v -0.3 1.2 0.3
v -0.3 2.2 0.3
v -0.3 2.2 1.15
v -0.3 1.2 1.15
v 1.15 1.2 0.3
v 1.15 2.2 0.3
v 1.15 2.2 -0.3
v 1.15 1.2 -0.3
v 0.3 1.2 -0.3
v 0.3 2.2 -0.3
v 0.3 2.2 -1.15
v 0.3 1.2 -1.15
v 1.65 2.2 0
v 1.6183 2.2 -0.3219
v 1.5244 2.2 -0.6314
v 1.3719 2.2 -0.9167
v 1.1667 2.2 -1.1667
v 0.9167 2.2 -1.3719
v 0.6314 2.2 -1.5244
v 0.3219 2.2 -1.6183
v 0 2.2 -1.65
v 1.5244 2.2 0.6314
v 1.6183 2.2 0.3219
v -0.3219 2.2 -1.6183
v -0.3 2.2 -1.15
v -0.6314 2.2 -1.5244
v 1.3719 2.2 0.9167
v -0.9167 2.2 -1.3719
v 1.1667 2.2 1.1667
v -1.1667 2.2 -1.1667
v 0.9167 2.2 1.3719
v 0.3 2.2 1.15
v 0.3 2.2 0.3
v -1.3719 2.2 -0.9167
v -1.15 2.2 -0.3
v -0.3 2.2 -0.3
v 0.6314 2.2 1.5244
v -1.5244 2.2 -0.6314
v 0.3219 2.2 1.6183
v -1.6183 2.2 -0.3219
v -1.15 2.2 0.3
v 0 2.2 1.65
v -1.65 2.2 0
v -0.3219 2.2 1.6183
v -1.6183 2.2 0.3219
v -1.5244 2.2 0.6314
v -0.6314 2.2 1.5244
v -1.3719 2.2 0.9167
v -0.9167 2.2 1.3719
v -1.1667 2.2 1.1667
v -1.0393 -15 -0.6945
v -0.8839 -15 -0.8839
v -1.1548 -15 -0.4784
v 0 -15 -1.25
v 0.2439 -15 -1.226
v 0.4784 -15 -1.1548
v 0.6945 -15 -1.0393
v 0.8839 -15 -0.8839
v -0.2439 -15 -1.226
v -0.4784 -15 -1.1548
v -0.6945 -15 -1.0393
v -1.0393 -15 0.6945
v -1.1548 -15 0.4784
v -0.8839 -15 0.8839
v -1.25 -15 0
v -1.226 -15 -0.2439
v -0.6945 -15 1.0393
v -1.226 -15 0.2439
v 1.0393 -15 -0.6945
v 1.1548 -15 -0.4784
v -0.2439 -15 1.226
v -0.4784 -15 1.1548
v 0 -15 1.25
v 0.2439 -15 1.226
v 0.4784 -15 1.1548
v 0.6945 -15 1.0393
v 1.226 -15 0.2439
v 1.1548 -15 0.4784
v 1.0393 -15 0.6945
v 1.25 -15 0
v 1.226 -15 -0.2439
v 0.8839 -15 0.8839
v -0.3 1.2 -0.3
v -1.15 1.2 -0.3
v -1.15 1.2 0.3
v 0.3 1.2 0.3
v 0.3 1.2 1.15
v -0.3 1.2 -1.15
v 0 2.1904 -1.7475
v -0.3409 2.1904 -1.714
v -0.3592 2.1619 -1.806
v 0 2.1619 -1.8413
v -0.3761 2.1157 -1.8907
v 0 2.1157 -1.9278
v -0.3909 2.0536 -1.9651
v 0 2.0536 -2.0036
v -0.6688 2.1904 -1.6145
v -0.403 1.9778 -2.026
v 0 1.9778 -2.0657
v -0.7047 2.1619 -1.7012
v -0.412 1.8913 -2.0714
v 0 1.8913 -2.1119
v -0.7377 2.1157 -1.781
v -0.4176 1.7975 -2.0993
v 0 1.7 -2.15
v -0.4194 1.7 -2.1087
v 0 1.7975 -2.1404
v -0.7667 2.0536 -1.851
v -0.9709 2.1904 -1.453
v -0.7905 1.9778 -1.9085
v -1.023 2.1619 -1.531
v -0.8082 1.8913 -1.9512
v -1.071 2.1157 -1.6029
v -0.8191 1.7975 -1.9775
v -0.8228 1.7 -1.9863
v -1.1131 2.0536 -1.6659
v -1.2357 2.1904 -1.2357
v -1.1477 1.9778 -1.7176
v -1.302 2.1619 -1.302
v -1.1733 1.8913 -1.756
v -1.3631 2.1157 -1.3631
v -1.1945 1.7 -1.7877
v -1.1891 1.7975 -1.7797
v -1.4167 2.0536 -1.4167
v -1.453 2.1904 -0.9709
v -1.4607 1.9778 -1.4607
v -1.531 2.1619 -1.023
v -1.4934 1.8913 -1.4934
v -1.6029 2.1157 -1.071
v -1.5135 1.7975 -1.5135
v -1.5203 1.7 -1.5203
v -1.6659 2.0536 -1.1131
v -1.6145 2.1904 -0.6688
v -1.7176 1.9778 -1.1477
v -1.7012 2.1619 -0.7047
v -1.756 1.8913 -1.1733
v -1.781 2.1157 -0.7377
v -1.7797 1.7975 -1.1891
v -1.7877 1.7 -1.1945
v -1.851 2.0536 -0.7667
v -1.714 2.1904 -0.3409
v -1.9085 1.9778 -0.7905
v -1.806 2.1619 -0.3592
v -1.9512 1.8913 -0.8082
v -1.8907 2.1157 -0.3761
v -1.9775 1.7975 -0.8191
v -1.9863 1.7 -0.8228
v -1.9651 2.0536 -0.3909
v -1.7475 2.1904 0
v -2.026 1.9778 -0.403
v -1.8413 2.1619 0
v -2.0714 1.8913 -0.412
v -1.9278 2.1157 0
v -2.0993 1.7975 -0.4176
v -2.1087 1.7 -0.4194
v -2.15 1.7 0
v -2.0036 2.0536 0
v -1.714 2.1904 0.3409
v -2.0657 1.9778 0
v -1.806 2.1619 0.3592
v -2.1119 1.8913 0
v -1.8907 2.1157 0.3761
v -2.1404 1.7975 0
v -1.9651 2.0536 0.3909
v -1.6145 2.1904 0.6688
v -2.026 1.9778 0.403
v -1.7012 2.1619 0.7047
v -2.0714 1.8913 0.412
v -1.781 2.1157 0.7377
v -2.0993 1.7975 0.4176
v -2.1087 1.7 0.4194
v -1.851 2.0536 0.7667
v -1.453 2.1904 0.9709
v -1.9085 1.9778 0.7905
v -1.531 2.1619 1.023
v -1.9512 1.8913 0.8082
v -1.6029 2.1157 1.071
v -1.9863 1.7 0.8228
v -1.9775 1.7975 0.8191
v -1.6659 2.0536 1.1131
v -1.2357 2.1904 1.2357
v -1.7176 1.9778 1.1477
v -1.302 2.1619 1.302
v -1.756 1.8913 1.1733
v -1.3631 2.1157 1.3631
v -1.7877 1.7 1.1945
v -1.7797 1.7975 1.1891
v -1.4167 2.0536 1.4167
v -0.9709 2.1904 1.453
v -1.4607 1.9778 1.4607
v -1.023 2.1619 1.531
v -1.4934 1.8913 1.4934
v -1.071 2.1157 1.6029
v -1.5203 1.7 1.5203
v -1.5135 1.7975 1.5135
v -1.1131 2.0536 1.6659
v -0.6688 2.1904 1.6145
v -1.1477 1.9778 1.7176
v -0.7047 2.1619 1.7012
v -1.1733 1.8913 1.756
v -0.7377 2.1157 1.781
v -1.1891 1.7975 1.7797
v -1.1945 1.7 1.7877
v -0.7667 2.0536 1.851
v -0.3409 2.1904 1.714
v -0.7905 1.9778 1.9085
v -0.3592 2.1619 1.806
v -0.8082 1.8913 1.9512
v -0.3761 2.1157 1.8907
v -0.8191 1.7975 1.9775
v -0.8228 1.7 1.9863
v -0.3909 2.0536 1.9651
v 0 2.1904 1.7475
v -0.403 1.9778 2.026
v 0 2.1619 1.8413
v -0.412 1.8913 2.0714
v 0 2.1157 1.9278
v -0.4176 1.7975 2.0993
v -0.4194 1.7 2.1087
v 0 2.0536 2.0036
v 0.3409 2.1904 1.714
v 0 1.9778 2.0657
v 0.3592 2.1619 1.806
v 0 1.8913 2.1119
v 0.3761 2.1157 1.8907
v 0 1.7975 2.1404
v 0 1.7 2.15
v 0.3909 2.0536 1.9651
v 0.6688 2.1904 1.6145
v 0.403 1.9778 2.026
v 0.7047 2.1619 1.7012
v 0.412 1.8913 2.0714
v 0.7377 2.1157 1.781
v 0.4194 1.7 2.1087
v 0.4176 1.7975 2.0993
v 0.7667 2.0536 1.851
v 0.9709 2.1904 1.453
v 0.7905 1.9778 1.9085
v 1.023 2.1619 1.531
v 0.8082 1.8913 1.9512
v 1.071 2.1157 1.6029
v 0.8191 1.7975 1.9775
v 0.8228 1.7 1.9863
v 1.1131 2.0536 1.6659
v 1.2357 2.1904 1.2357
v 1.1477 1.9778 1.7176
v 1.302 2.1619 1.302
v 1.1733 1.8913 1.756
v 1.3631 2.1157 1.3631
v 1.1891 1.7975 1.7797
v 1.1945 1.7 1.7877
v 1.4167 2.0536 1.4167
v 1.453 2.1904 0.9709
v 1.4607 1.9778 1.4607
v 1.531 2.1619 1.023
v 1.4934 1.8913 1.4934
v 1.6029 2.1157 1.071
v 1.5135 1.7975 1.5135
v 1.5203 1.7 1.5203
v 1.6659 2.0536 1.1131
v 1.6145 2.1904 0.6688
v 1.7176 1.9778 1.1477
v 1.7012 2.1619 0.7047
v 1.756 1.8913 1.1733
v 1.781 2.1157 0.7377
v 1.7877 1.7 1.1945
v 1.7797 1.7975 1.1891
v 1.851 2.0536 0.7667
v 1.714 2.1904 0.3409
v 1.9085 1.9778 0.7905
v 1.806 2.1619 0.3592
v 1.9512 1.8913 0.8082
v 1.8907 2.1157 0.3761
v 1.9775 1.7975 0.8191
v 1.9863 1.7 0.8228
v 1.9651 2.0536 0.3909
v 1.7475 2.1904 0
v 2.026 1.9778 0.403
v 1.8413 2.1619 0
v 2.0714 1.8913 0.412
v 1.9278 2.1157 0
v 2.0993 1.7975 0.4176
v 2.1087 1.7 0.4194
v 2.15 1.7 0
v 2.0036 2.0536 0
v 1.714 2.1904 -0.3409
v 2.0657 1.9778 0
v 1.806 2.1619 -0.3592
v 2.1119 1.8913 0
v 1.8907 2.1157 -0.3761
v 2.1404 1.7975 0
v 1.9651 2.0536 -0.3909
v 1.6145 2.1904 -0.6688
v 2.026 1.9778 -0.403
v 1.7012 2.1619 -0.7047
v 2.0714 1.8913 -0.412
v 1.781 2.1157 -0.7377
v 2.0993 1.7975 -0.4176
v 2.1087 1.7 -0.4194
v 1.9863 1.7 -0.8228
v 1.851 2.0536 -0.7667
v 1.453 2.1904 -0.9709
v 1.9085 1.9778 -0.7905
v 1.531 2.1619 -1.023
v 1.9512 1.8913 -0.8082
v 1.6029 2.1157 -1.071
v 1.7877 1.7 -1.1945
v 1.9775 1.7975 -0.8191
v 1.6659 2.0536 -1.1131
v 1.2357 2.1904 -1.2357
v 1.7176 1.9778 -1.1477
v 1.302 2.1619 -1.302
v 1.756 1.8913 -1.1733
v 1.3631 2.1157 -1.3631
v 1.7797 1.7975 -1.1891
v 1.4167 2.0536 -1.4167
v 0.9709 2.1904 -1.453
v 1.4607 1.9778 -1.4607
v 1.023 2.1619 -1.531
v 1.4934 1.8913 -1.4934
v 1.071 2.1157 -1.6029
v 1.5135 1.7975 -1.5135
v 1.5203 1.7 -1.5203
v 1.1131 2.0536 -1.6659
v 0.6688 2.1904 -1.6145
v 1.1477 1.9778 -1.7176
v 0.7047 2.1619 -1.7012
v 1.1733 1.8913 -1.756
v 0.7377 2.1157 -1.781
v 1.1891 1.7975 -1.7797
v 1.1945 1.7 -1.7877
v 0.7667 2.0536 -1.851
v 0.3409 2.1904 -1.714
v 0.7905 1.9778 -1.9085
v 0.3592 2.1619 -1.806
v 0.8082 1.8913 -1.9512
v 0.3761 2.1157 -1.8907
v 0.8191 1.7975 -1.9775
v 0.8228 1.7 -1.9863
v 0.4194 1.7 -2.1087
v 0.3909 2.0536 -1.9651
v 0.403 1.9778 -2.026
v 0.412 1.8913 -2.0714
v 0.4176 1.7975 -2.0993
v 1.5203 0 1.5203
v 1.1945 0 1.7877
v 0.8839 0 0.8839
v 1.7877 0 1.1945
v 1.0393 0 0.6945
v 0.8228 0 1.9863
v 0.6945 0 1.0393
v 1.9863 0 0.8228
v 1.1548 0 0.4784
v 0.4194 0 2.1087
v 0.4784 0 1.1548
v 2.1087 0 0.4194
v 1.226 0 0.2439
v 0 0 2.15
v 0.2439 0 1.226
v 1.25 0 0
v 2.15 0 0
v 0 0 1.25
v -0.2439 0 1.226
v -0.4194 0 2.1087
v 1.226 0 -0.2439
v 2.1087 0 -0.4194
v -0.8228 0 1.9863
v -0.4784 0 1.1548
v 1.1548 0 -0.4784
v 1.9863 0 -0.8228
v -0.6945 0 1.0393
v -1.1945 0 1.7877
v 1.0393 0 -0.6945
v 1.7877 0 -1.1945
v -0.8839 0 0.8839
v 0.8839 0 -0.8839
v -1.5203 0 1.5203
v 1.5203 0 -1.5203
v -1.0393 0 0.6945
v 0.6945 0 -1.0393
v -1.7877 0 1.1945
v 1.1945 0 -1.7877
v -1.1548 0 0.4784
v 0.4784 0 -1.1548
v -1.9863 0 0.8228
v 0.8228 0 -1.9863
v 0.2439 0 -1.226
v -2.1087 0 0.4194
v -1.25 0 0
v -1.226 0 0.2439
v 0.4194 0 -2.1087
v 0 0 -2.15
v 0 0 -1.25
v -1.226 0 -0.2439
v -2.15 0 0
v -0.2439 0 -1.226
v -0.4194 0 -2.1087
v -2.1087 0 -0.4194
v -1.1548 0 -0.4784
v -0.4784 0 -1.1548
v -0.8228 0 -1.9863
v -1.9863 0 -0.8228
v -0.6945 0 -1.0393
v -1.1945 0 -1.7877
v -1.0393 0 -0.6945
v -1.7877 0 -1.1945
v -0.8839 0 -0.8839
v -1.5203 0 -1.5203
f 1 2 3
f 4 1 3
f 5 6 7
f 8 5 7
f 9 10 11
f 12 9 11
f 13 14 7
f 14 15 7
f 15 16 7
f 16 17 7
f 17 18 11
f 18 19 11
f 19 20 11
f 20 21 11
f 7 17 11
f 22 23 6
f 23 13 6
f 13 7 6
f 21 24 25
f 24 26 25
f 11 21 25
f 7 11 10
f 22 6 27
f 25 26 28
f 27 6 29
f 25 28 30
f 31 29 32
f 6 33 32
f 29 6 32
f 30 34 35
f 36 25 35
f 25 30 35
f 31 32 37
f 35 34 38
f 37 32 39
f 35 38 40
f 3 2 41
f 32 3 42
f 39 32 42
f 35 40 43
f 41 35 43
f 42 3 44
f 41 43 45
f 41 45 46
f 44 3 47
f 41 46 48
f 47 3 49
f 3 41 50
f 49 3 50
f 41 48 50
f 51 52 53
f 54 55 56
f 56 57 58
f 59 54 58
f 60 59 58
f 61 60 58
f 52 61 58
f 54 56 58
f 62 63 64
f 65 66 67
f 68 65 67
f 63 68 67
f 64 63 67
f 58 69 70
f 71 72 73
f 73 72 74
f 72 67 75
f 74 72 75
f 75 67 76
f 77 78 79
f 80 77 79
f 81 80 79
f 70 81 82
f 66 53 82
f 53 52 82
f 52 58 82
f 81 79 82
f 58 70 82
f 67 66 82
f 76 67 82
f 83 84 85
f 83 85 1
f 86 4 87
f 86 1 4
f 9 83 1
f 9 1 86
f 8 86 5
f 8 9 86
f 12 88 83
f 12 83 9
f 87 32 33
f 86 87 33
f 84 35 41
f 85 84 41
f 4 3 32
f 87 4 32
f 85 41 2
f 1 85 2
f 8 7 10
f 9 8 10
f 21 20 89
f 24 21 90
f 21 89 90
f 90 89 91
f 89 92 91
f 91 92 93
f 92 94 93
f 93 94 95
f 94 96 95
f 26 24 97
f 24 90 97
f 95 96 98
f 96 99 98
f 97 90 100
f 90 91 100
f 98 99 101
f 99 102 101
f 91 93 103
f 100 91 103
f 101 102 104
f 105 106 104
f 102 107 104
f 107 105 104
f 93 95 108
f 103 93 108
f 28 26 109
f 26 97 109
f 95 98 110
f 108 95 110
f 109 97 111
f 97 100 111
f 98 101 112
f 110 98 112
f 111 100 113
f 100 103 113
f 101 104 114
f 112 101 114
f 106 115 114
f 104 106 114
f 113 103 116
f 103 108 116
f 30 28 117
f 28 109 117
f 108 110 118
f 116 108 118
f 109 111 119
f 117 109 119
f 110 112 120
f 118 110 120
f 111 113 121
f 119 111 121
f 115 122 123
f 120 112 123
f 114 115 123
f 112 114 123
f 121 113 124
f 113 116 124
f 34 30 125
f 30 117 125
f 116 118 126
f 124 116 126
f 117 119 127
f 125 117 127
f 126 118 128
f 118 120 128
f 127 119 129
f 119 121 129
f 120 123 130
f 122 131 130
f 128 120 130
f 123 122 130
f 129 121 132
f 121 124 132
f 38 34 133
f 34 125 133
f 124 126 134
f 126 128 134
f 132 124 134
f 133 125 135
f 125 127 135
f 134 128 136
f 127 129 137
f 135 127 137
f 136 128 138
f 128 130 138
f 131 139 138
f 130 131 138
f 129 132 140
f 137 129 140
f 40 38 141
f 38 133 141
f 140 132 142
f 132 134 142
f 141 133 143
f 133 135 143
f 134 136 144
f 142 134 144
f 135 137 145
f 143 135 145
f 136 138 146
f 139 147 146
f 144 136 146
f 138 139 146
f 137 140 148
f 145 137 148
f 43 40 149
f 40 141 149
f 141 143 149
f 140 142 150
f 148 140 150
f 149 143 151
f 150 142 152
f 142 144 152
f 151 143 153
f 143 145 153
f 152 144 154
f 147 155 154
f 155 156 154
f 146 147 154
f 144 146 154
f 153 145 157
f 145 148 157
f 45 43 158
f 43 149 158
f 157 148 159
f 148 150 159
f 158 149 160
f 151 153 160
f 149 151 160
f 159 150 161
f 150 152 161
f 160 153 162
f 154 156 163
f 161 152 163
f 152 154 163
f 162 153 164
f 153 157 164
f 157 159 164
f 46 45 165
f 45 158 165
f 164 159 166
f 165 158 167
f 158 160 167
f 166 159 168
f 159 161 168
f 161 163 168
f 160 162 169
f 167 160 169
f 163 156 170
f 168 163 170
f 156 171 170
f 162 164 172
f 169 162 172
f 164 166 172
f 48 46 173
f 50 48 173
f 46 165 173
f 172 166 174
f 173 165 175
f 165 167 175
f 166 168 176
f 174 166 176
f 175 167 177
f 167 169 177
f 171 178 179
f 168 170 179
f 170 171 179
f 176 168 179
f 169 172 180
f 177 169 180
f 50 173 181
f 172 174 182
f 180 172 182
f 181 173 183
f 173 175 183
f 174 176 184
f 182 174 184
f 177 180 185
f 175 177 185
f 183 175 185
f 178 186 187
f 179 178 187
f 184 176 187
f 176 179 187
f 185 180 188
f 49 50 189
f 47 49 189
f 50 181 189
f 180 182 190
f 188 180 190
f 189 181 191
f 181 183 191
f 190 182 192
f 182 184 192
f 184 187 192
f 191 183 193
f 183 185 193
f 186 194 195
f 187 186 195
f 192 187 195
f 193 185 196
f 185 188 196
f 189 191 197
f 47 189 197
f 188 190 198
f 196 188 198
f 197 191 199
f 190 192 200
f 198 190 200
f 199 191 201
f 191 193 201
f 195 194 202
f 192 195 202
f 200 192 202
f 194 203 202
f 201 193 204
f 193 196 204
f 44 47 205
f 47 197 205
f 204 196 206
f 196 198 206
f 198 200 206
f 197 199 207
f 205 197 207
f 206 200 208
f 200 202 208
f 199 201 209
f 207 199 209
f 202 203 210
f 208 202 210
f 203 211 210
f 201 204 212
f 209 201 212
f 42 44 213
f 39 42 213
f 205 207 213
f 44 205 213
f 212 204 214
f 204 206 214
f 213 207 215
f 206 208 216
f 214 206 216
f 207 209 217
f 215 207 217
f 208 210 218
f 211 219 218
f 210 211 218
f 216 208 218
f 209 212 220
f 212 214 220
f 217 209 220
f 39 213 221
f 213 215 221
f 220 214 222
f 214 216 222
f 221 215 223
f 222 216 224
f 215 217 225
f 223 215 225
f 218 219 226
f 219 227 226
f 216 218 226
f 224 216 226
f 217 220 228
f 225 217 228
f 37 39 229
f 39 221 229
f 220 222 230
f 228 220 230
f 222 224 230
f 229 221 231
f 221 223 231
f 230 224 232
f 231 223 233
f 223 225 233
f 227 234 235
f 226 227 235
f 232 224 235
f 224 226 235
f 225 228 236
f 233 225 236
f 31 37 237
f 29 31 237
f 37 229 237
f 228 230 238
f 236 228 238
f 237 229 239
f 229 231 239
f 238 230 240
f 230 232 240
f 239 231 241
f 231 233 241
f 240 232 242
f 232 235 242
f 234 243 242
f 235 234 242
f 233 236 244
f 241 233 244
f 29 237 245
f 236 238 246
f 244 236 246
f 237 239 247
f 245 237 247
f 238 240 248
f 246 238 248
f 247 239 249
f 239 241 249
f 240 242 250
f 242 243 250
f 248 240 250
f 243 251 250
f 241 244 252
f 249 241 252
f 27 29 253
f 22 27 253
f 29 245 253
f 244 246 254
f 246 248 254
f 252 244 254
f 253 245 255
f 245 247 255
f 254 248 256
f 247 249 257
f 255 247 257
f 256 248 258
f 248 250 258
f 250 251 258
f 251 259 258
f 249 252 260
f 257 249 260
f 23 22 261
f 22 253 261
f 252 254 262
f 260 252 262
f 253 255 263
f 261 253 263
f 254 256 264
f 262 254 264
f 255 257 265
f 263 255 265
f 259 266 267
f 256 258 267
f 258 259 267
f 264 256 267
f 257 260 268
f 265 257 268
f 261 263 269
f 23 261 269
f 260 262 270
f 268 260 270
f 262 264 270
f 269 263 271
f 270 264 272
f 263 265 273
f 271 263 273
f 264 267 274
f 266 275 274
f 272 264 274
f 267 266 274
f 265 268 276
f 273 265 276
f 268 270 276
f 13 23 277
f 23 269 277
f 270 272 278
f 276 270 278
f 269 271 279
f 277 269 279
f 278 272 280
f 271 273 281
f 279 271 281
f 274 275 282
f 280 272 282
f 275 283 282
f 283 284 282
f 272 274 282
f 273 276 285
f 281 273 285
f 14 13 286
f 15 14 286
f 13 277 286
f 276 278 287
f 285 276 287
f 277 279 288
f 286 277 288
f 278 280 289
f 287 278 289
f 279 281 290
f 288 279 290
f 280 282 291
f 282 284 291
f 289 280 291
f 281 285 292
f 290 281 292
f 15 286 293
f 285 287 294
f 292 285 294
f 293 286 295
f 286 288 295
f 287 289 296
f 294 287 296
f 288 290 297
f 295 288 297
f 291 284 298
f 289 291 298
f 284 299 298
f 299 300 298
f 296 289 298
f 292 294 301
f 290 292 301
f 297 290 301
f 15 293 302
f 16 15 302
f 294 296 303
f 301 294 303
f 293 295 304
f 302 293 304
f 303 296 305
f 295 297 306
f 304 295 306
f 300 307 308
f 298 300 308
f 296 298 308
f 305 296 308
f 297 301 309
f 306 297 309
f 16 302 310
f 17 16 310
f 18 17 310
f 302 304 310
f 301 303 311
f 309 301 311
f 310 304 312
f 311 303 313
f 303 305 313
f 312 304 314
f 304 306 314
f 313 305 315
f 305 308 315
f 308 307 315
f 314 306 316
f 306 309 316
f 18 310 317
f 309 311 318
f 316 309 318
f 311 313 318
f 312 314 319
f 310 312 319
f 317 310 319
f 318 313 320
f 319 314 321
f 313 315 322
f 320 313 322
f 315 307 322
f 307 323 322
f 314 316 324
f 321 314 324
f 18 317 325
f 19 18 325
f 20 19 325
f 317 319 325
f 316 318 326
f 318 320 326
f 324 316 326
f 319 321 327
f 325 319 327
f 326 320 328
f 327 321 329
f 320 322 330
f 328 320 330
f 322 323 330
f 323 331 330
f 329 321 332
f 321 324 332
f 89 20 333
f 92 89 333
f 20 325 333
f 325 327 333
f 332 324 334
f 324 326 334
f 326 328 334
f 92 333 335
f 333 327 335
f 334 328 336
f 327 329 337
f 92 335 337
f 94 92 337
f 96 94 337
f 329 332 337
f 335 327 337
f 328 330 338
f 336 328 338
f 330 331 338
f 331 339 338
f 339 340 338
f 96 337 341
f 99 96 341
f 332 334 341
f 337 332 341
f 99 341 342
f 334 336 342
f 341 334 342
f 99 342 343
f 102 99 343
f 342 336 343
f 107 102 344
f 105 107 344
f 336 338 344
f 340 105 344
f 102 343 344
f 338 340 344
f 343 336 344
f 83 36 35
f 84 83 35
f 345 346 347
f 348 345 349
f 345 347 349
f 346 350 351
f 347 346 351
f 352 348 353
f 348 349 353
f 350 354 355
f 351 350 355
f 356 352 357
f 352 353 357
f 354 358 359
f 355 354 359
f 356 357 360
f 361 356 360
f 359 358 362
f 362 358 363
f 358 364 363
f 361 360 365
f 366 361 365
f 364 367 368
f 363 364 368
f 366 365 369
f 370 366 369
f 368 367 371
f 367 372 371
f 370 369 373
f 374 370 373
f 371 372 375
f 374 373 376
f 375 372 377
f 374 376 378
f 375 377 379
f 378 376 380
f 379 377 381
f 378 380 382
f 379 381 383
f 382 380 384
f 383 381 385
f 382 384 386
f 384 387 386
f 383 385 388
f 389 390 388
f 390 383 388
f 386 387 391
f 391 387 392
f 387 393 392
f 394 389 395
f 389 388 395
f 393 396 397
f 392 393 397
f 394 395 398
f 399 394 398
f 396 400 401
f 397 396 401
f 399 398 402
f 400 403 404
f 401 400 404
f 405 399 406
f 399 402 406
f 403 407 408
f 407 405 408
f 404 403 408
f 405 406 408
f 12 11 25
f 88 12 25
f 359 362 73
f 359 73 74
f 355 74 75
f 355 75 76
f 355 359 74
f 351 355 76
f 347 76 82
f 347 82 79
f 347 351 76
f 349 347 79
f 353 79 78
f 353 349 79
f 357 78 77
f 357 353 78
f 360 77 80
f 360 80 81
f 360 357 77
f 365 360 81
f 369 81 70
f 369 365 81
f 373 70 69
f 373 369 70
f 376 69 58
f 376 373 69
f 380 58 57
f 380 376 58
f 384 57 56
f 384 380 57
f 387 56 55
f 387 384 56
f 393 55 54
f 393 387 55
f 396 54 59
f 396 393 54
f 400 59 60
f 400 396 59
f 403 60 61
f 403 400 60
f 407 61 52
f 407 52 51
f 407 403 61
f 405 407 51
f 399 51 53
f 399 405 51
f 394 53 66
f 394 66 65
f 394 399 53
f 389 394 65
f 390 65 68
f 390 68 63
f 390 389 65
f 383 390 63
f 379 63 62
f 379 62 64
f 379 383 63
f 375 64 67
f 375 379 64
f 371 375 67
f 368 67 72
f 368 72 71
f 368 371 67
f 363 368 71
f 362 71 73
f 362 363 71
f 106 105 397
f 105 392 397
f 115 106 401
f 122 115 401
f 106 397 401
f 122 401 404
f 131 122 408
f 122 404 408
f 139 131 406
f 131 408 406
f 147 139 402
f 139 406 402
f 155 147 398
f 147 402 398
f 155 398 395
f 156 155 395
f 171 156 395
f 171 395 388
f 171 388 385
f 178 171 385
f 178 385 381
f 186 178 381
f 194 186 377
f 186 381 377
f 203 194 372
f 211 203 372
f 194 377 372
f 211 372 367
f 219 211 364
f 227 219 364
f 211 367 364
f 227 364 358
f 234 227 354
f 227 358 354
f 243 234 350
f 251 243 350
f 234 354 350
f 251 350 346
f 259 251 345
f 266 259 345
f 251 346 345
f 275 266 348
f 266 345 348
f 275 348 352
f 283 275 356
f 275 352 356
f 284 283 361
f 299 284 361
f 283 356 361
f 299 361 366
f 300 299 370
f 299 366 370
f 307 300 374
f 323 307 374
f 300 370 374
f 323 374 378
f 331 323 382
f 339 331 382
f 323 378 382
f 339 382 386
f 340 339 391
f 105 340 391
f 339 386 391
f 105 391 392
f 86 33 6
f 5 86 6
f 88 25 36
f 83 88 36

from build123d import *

# Parameters (mm, degrees)
SKETCH2_R     = 1.25
SHAFT_DEPTH   = 15
PHILIPS_DEPTH = 1


with BuildPart() as part:
    # Sketch2 → Shaft (new body)
    with BuildSketch(Plane(origin=(0, 0, 0), x_dir=(1, 0, 0), z_dir=(0, 1, 0))):
        Circle(SKETCH2_R)
    extrude(amount=-SHAFT_DEPTH)

    # Sketch3 → Head (revolve)
    with BuildSketch(Plane.XY):
        with BuildLine():
            Line((0, 0), (0, 2.2))
            Line((0, 2.2), (1.65, 2.2))
            ThreePointArc((1.65, 2.2), (2.003553391, 2.053553391), (2.15, 1.7))
            Line((2.15, 1.7), (2.15, 0))
            Line((2.15, 0), (0, 0))
        make_face()
    revolve(axis=Axis((0, 0, 0), (0, 1, 0)))

    # Sketch5 → Philips (cut)
    with BuildSketch(Plane(origin=(0, 2.2, 0), x_dir=(1, 0, 0), z_dir=(0, 1, 0))):
        Polygon((-0.3, -1.15), (0.3, -1.15), (0.3, -0.3), (1.15, -0.3), (1.15, 0.3), (0.3, 0.3), (0.3, 1.15), (-0.3, 1.15), (-0.3, 0.3), (-1.15, 0.3), (-1.15, -0.3), (-0.3, -0.3), align=None)
    extrude(amount=-PHILIPS_DEPTH, mode=Mode.SUBTRACT)


solid = part.part
